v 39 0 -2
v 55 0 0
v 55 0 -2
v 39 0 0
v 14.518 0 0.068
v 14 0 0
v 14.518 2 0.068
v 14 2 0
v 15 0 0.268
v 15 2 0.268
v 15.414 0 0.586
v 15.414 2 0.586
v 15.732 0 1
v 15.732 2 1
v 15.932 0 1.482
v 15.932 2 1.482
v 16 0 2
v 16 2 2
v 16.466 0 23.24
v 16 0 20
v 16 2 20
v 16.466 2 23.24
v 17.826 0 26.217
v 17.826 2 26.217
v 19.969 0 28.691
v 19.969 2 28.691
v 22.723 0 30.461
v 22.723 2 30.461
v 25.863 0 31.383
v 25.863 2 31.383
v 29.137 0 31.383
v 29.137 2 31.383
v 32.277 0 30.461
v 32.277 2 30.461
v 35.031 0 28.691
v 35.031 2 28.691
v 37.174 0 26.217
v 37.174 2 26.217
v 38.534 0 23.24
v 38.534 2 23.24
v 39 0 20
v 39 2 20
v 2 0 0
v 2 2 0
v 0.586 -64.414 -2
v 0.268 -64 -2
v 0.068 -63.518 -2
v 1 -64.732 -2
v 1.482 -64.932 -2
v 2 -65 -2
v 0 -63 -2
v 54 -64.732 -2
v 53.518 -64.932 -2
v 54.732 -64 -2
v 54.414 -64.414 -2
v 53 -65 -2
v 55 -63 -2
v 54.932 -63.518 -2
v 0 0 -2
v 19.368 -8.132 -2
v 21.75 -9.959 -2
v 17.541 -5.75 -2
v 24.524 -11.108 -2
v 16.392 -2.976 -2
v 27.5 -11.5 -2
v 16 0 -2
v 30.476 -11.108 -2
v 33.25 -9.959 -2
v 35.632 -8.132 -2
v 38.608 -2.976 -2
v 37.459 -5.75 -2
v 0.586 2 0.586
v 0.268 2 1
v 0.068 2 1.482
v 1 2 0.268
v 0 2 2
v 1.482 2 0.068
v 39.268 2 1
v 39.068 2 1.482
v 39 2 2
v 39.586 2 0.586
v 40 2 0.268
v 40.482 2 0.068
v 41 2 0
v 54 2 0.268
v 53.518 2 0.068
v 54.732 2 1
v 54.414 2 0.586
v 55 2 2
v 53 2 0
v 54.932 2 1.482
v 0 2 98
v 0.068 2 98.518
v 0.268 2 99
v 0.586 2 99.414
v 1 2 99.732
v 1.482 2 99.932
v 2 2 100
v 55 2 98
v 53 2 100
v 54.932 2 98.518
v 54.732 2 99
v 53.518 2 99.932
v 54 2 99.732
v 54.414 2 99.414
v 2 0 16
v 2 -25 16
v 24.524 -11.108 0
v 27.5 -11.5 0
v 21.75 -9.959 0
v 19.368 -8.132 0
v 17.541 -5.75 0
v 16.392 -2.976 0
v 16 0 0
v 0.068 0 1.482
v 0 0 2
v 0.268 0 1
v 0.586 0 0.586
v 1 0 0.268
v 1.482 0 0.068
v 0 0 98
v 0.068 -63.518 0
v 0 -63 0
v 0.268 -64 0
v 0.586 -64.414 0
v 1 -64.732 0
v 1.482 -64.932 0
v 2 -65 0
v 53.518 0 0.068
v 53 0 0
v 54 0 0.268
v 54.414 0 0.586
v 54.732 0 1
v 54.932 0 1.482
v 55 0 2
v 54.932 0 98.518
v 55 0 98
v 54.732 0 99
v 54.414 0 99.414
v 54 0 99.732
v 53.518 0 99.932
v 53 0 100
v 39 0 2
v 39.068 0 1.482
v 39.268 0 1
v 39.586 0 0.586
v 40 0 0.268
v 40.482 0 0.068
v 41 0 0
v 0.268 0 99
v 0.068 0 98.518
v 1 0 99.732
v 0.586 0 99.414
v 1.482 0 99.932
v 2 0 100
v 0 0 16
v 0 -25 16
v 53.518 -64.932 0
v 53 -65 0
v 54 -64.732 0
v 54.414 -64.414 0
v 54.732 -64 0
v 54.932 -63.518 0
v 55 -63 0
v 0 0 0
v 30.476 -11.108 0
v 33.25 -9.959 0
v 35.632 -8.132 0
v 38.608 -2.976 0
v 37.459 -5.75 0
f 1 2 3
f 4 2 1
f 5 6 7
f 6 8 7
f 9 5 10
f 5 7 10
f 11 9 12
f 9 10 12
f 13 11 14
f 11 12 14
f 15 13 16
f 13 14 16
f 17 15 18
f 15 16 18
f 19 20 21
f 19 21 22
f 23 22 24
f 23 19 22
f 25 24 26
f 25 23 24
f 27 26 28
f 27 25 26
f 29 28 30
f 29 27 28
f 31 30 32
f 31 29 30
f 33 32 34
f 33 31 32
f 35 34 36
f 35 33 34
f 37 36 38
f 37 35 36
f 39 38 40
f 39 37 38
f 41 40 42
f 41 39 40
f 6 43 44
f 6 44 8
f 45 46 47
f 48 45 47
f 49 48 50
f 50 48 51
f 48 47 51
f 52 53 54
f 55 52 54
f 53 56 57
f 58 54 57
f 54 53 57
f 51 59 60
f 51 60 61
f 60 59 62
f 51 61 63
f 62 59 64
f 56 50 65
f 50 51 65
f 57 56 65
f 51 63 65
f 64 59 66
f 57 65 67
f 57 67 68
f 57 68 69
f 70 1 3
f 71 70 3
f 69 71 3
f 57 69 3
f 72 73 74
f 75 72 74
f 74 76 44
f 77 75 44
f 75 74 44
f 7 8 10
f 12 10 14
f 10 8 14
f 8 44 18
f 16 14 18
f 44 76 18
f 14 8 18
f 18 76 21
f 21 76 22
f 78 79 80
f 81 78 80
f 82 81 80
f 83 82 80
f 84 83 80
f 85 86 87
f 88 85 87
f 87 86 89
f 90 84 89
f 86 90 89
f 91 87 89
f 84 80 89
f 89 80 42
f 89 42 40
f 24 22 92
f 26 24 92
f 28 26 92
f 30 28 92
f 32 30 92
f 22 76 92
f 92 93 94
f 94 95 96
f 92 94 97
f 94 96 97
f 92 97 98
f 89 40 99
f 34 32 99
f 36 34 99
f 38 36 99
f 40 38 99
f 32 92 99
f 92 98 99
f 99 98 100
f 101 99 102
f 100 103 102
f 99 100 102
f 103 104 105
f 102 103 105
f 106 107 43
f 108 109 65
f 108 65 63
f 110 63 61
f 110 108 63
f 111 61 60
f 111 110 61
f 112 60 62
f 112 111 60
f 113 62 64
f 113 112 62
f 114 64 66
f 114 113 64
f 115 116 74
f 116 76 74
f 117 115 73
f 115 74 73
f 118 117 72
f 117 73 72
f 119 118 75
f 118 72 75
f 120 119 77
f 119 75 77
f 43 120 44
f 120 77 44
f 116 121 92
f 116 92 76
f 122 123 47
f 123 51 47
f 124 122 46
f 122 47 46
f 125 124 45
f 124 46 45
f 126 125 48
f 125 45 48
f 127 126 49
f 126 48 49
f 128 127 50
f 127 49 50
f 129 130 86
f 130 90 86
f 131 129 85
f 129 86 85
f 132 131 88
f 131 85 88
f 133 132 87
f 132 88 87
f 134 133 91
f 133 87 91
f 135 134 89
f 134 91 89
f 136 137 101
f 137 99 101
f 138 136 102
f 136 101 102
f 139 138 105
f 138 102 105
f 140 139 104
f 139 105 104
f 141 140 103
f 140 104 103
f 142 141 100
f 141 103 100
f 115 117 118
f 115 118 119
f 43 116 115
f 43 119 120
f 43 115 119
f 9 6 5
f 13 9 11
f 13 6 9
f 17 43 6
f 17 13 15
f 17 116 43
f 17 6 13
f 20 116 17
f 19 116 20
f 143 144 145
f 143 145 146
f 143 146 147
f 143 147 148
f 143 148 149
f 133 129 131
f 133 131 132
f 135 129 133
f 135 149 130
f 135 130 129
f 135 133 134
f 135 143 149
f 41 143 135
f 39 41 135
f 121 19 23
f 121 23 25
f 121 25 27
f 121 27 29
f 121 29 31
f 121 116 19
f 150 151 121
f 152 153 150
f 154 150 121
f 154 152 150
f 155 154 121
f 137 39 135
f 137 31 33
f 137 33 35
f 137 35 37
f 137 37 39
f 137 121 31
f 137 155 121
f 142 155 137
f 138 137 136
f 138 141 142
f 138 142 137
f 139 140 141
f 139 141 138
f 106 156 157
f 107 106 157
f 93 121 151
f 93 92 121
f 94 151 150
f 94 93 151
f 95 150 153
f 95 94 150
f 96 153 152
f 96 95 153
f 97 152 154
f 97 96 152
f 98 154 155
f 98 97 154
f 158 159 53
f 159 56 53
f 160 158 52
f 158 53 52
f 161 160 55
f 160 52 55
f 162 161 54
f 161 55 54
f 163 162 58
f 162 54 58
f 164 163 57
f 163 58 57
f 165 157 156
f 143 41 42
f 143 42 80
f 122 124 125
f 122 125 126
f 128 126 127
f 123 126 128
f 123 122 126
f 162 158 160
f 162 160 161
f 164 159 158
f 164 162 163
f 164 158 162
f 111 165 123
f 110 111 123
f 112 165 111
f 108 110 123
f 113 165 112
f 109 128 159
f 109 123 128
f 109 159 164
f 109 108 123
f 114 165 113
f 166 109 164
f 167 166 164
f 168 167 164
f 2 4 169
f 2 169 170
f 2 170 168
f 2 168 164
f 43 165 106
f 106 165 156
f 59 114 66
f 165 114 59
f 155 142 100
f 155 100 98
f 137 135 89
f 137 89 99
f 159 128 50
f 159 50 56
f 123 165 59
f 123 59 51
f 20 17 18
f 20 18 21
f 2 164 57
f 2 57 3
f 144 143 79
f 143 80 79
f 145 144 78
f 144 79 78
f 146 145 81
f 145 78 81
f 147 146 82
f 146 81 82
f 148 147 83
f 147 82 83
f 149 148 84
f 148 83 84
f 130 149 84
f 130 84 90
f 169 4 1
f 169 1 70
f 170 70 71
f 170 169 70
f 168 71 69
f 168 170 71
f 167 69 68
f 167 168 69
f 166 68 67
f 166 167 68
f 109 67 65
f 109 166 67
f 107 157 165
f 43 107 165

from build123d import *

# Parameters (mm, degrees)
F1_DEPTH = 2
F2_R     = 2
F4_DEPTH = 2
F5_R     = 2
F7_DEPTH = 2


with BuildPart() as f1:
    # F0 (on Front) → F1 (new body)
    with BuildSketch(Plane.XZ):
        with BuildLine():
            Line((0, 100), (0, 0))
            Line((0, 0), (16, 0))
            Line((16, 0), (16, 20))
            ThreePointArc((16, 20), (27.5, 31.5), (39, 20))
            Line((39, 20), (39, 0))
            Line((39, 0), (55, 0))
            Line((55, 0), (55, 100))
            Line((55, 100), (0, 100))
        make_face()
    extrude(amount=-F1_DEPTH)

    # F2
    f2_edges = [f1.edges().sort_by_distance(p)[0] for p in [
        (0, 1, 100),
        (55, 1, 100),
        (55, 1, 0),
        (39, 1, 0),
        (16, 1, 0),
        (0, 1, 0),
    ]]
    fillet(f2_edges, radius=F2_R)


with BuildPart() as f4:
    # F3 (on Top) → F4 (new body)
    with BuildSketch(Plane.XY):
        with BuildLine():
            Line((16, 0), (0, 0))
            Line((0, 0), (0, -65))
            Line((0, -65), (55, -65))
            Line((55, -65), (55, 0))
            Line((55, 0), (39, 0))
            ThreePointArc((39, 0), (35.631728, -8.131728), (27.5, -11.5))
            ThreePointArc((27.5, -11.5), (19.368272, -8.131728), (16, 0))
        make_face()
    extrude(amount=-F4_DEPTH)

    # F5
    f5_edges = [f4.edges().sort_by_distance(p)[0] for p in [
        (0, -65, -1),
        (55, -65, -1),
    ]]
    fillet(f5_edges, radius=F5_R)


with BuildPart() as f7:
    # F6 (on Right) → F7 (new body)
    with BuildSketch(Plane.YZ):
        Polygon((-25, 16), (0, 0), (0, 16), align=None)
    extrude(amount=F7_DEPTH)


solid = Compound([f1.part, f4.part, f7.part])
